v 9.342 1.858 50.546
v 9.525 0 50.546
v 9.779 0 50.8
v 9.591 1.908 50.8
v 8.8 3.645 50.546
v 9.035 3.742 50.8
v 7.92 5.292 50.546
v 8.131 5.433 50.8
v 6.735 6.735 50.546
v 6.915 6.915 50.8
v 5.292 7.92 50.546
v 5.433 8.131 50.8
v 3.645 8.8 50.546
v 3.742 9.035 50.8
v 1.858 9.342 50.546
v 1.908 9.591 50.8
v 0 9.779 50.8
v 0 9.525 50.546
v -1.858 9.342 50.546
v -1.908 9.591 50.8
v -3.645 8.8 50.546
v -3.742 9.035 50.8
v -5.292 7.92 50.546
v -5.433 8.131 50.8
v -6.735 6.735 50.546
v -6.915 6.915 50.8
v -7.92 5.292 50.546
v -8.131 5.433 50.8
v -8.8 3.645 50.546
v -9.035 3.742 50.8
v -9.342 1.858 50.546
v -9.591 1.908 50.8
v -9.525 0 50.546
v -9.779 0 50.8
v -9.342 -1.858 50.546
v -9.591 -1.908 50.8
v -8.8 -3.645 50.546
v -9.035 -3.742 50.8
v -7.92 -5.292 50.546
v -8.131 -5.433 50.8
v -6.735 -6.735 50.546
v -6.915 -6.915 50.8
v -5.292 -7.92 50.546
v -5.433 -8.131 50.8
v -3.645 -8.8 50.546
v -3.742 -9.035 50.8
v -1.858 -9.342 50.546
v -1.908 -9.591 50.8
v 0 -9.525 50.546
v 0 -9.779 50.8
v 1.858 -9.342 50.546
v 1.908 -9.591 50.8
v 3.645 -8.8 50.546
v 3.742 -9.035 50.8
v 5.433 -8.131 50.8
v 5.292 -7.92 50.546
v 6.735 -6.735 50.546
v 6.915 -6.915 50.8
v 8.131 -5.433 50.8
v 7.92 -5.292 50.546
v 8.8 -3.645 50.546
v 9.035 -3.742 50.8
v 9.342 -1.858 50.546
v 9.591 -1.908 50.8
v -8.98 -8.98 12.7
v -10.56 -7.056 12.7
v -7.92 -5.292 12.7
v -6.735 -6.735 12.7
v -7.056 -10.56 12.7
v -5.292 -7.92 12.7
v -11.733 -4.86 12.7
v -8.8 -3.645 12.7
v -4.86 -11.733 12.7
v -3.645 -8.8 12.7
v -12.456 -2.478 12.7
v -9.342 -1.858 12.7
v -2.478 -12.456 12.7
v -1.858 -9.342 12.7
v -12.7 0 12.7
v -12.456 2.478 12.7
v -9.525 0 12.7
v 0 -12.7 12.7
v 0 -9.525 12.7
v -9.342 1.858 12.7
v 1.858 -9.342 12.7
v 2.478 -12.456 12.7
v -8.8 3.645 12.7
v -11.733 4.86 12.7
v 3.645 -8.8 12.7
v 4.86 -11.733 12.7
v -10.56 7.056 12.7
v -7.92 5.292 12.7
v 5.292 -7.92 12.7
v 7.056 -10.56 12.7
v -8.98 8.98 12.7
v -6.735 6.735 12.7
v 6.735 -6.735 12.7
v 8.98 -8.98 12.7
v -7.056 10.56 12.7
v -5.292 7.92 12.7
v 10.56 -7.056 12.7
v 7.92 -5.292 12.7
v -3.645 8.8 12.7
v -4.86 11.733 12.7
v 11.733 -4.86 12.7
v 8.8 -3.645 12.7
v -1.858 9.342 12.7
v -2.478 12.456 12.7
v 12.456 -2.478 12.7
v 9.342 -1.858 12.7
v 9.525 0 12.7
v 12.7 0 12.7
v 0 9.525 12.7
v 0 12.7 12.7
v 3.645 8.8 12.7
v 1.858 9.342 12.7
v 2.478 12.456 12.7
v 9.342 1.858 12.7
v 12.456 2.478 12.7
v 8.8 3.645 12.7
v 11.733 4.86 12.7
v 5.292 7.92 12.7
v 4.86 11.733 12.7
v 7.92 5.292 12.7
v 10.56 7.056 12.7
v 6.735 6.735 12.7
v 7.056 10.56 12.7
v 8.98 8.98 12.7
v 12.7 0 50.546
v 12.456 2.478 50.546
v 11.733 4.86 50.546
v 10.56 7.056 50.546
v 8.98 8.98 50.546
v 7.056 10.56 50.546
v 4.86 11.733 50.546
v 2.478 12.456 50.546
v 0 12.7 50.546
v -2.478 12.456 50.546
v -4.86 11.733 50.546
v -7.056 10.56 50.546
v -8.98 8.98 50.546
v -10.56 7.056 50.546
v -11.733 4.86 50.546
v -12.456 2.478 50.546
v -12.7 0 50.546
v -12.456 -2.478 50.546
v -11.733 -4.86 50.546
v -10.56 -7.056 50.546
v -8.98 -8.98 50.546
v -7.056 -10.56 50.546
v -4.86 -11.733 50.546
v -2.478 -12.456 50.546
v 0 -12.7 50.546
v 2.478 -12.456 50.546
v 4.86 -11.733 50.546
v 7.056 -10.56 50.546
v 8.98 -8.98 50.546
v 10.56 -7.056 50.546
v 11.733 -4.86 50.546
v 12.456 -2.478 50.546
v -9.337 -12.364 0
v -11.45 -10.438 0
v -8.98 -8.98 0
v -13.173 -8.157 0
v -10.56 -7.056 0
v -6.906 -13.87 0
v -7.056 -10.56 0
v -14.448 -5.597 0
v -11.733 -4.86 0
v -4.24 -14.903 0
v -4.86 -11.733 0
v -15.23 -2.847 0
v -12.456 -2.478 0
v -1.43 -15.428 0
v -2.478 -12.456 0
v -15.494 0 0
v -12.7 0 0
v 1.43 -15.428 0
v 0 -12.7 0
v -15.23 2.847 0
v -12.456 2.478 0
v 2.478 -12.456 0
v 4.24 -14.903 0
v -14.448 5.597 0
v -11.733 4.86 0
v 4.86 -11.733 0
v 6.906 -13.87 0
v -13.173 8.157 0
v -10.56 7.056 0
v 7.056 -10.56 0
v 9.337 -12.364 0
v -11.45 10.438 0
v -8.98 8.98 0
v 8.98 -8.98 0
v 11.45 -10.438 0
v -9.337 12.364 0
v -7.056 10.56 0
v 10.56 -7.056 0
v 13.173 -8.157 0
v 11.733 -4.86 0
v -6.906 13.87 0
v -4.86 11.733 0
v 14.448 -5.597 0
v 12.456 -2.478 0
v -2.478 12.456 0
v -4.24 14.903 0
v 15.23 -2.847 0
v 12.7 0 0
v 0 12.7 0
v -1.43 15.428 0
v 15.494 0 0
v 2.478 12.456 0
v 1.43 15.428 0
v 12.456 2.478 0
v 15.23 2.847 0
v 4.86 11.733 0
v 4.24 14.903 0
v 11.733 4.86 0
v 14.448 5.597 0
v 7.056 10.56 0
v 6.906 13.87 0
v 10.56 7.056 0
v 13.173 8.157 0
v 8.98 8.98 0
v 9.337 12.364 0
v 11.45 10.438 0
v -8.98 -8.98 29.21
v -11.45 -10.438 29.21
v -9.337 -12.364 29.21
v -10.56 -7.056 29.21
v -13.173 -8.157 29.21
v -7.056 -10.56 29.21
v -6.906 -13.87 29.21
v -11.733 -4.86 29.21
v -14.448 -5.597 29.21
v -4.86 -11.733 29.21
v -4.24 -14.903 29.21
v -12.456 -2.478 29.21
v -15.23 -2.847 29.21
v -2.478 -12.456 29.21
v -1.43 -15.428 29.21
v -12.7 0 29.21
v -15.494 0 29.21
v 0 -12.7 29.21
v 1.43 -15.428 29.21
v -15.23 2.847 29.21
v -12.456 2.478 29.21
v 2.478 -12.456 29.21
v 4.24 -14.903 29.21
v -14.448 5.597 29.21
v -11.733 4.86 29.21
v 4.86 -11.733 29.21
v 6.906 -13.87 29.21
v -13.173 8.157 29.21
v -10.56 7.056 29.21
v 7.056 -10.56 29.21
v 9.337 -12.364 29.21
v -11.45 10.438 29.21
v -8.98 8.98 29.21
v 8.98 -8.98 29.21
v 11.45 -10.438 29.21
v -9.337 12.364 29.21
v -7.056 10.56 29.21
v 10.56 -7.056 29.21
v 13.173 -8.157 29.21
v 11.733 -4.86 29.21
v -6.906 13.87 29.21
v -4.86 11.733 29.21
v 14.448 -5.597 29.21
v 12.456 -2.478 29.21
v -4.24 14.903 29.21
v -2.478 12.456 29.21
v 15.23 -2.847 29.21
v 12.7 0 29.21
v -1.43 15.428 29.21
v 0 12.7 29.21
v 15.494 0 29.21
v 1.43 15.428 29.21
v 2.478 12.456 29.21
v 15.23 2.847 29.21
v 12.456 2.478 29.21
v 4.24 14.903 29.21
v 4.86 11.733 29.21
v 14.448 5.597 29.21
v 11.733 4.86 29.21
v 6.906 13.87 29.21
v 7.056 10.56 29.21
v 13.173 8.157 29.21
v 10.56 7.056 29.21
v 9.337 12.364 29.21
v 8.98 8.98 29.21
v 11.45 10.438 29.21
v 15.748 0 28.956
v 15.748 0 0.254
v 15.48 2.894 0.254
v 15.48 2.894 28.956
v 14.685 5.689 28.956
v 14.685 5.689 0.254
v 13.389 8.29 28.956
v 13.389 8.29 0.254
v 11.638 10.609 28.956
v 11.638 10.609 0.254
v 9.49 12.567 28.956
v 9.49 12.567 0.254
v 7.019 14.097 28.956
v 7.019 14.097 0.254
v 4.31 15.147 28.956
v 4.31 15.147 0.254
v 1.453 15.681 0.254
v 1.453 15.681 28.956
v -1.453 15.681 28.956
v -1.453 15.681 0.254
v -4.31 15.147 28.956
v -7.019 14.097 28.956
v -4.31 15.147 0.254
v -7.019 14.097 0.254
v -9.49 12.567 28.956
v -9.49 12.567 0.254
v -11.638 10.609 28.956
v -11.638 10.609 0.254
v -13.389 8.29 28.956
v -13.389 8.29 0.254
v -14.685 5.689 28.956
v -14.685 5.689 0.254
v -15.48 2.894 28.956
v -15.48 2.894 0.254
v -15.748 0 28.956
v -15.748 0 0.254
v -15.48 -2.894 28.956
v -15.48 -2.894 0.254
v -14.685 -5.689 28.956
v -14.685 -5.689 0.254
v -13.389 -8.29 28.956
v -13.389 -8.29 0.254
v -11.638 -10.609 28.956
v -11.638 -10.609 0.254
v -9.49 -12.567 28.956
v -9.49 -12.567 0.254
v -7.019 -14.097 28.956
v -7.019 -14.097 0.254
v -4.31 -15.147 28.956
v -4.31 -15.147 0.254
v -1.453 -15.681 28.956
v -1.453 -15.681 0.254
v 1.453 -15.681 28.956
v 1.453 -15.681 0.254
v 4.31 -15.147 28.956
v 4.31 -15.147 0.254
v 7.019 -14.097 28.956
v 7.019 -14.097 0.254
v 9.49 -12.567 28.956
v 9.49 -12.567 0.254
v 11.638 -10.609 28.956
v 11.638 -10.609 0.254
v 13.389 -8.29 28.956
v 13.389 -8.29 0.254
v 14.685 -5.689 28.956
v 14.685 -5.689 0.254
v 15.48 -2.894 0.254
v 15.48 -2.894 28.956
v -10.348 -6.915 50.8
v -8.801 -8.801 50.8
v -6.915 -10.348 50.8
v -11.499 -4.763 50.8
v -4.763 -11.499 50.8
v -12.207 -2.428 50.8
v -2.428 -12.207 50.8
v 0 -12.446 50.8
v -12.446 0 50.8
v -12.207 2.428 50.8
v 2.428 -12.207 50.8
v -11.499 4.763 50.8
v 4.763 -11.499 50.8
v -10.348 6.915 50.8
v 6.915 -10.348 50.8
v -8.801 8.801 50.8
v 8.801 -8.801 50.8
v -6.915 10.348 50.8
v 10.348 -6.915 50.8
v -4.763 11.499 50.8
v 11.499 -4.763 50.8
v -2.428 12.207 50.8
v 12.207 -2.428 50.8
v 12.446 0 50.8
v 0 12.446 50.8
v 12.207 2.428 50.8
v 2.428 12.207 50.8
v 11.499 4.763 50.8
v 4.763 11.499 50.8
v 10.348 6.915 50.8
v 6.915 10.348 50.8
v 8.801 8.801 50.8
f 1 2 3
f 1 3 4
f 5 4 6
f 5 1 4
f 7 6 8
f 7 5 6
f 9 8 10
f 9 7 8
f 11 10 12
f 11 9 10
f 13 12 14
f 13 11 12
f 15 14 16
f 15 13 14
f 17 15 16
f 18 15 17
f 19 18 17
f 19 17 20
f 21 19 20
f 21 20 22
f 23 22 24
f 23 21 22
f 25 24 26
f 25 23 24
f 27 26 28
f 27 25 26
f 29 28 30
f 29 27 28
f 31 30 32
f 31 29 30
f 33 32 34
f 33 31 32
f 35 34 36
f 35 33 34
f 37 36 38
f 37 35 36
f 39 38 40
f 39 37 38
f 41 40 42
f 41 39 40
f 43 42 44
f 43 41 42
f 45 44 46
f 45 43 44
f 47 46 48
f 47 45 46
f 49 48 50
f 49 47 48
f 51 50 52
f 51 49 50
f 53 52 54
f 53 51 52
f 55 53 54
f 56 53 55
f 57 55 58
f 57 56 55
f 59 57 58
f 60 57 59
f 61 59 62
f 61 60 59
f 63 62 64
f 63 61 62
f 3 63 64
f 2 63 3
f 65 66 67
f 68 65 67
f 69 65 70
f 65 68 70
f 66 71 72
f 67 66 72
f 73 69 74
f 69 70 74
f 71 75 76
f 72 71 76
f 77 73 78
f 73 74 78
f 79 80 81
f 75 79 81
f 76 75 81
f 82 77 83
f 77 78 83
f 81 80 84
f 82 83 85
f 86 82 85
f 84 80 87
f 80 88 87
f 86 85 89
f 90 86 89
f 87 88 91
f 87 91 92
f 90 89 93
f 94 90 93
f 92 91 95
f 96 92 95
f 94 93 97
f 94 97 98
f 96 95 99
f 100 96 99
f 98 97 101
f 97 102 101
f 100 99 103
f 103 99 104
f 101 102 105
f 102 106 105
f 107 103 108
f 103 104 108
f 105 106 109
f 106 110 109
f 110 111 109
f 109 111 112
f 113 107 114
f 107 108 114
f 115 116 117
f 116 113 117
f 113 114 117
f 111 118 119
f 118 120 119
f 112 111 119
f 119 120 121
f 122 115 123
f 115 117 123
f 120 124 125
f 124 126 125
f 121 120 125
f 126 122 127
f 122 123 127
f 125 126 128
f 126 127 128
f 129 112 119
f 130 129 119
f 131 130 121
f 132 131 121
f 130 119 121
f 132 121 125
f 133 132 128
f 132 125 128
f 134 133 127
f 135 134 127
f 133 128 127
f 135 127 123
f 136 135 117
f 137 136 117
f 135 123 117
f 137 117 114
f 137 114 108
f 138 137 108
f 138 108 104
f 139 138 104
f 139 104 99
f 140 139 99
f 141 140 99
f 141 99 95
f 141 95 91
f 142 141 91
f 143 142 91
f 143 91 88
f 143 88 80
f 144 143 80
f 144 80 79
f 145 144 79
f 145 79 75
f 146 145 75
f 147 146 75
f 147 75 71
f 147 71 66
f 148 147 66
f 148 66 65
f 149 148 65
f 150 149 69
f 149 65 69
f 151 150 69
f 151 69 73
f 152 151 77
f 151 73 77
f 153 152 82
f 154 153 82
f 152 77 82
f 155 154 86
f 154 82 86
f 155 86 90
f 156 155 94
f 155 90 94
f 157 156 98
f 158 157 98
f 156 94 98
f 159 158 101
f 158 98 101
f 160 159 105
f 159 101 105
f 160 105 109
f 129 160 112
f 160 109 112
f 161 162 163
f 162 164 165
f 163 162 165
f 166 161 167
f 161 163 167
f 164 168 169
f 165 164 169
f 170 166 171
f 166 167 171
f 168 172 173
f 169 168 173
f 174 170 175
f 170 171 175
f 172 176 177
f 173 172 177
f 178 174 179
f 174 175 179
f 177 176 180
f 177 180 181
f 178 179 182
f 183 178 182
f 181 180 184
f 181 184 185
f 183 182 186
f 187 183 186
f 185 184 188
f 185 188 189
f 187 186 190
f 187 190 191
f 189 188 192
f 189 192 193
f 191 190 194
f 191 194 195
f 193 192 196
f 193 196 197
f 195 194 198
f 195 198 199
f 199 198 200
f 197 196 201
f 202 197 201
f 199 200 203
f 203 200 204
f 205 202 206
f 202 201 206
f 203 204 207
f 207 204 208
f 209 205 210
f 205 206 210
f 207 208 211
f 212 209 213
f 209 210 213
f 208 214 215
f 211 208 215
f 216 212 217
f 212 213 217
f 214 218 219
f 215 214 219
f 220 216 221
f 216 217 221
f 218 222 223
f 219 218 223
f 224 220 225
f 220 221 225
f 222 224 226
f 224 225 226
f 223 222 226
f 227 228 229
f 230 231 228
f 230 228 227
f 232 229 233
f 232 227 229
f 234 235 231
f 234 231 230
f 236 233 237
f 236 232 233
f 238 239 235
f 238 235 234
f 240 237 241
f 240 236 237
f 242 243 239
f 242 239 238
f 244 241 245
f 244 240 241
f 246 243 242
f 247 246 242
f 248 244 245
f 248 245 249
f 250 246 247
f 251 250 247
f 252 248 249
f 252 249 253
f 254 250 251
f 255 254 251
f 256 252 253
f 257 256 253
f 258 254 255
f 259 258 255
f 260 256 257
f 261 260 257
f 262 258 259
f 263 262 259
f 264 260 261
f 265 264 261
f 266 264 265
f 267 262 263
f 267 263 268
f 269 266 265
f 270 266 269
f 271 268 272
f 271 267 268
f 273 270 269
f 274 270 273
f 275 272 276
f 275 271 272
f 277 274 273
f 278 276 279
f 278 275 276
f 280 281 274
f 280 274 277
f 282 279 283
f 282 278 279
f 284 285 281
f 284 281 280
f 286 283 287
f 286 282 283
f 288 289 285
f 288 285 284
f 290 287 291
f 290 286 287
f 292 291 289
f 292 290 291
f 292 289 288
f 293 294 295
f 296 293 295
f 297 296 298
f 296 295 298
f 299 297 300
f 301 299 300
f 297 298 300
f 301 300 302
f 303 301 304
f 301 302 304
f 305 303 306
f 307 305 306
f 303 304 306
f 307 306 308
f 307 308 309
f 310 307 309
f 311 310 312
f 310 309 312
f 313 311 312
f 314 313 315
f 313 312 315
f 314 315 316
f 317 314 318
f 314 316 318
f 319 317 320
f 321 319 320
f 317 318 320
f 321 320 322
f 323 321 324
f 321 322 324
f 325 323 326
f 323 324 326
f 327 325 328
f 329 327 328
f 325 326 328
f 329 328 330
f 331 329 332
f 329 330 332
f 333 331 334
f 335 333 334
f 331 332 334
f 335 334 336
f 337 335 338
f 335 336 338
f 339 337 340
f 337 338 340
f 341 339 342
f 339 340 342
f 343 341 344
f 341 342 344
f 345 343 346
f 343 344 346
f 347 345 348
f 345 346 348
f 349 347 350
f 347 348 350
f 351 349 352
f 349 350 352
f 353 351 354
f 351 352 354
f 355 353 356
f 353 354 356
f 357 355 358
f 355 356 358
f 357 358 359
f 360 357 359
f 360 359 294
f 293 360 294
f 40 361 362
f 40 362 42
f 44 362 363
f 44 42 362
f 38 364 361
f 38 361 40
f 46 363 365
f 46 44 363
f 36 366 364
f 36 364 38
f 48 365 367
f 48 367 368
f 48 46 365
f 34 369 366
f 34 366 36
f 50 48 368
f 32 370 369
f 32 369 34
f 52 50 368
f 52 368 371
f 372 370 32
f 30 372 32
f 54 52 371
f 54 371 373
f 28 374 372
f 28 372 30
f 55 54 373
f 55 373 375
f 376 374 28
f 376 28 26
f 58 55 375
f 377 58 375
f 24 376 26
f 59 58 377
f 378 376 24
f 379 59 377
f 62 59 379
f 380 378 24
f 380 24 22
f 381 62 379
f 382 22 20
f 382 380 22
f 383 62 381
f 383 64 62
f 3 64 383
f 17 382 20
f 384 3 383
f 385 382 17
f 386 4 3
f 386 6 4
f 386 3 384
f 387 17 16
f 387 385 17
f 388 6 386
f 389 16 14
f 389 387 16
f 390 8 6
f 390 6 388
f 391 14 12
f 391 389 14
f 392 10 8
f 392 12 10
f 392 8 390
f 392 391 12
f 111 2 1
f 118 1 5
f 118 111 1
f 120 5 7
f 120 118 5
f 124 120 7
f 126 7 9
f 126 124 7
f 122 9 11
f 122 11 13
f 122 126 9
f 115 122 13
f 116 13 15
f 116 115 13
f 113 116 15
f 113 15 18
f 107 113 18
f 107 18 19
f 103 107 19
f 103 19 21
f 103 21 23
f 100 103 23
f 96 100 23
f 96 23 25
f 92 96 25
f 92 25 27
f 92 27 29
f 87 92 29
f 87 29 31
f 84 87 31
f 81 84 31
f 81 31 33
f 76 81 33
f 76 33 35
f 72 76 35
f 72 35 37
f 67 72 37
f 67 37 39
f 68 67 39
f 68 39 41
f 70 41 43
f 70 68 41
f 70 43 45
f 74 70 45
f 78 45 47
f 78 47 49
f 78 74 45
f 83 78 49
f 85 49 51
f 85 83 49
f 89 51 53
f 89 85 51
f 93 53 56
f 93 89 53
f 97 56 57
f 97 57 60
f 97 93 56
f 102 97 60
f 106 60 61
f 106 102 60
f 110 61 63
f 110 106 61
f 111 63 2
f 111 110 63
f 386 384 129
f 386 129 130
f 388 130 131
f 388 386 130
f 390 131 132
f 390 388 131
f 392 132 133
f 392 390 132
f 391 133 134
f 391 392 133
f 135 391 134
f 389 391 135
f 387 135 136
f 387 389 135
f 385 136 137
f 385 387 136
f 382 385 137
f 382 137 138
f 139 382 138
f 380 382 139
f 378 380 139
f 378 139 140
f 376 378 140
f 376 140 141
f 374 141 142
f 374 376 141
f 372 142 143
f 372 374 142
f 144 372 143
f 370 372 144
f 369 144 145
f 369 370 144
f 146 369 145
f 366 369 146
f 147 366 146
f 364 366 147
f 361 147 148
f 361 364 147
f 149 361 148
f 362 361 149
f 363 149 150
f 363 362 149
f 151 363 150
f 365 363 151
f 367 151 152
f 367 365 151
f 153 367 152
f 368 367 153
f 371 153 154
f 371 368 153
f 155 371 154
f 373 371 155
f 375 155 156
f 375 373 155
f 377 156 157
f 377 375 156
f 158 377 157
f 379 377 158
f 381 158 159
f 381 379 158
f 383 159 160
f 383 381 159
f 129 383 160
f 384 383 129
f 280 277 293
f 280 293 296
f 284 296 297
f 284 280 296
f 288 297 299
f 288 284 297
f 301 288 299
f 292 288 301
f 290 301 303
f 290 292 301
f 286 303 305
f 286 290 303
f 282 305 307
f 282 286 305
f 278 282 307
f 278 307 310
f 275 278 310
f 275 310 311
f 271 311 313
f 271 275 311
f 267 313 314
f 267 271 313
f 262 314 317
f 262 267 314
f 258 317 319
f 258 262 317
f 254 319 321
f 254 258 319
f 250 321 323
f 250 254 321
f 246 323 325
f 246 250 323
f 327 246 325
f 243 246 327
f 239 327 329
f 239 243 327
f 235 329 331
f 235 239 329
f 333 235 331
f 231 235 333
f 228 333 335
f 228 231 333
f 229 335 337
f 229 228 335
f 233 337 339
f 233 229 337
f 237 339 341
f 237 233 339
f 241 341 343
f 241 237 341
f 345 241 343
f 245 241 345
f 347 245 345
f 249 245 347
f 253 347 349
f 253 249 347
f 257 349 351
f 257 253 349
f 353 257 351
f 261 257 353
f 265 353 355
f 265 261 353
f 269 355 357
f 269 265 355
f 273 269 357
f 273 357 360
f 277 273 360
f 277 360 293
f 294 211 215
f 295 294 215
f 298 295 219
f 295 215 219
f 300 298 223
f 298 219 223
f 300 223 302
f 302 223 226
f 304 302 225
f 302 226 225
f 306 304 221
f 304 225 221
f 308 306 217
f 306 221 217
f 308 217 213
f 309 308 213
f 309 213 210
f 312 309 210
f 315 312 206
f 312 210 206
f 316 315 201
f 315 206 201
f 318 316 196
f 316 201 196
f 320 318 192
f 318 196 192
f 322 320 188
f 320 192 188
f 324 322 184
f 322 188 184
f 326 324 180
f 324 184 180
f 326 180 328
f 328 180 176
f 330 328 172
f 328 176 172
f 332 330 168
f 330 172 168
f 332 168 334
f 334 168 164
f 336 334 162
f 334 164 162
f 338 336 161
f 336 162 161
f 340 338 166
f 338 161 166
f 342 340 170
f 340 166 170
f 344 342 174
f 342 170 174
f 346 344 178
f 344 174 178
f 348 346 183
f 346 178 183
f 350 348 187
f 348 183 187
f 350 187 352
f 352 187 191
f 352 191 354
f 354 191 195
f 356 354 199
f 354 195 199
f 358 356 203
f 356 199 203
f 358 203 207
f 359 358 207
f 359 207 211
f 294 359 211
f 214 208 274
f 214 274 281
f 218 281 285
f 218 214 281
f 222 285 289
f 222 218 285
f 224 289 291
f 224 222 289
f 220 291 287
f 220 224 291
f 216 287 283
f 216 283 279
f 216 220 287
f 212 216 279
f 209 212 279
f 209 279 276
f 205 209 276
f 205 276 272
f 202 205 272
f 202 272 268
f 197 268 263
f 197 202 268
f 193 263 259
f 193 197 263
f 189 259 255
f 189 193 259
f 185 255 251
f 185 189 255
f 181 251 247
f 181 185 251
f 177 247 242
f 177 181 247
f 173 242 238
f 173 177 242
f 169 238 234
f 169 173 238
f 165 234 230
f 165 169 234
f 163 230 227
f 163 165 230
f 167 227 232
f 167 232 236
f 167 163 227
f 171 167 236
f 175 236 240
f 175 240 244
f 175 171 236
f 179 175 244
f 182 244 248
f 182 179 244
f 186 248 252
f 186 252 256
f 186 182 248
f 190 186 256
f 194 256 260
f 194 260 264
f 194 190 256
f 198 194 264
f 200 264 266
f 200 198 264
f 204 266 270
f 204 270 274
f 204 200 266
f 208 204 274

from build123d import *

# Parameters (mm, degrees)
F0_R      = 15.748
F0_R_2    = 12.7
F1_DEPTH  = 29.21
F0_R_3    = 9.525
F2_DEPTH  = 50.8
F3_DEPTH  = 12.7
F4_SIZE   = 0.254
F4_2_SIZE = 0.254


with BuildPart() as f1:
    # F0 (on Top) → F1 (new body)
    with BuildSketch(Plane.XY):
        Circle(F0_R)
        Circle(F0_R_2, mode=Mode.SUBTRACT)
    extrude(amount=F1_DEPTH)

    # F4#2
    f4_2_edges = [f1.edges().sort_by_distance(p)[0] for p in [
        (-15.748, 0, 29.21),
        (-15.748, 0, 0),
    ]]
    chamfer(f4_2_edges, length=F4_2_SIZE)


with BuildPart() as f2:
    # F0 (on Top) → F2 (new body)
    with BuildSketch(Plane.XY):
        Circle(F0_R_2)
        Circle(F0_R_3, mode=Mode.SUBTRACT)
    extrude(amount=F2_DEPTH)

    # F0 (on Top) → F3 (cut)
    with BuildSketch(Plane.XY):
        Circle(F0_R_2)
        Circle(F0_R_3, mode=Mode.SUBTRACT)
    extrude(amount=F3_DEPTH, mode=Mode.SUBTRACT)

    # F4
    f4_edges = [f2.edges().sort_by_distance(p)[0] for p in [
        (-12.7, 0, 50.8),
        (-9.525, 0, 50.8),
    ]]
    chamfer(f4_edges, length=F4_SIZE)


solid = Compound([f1.part, f2.part])
